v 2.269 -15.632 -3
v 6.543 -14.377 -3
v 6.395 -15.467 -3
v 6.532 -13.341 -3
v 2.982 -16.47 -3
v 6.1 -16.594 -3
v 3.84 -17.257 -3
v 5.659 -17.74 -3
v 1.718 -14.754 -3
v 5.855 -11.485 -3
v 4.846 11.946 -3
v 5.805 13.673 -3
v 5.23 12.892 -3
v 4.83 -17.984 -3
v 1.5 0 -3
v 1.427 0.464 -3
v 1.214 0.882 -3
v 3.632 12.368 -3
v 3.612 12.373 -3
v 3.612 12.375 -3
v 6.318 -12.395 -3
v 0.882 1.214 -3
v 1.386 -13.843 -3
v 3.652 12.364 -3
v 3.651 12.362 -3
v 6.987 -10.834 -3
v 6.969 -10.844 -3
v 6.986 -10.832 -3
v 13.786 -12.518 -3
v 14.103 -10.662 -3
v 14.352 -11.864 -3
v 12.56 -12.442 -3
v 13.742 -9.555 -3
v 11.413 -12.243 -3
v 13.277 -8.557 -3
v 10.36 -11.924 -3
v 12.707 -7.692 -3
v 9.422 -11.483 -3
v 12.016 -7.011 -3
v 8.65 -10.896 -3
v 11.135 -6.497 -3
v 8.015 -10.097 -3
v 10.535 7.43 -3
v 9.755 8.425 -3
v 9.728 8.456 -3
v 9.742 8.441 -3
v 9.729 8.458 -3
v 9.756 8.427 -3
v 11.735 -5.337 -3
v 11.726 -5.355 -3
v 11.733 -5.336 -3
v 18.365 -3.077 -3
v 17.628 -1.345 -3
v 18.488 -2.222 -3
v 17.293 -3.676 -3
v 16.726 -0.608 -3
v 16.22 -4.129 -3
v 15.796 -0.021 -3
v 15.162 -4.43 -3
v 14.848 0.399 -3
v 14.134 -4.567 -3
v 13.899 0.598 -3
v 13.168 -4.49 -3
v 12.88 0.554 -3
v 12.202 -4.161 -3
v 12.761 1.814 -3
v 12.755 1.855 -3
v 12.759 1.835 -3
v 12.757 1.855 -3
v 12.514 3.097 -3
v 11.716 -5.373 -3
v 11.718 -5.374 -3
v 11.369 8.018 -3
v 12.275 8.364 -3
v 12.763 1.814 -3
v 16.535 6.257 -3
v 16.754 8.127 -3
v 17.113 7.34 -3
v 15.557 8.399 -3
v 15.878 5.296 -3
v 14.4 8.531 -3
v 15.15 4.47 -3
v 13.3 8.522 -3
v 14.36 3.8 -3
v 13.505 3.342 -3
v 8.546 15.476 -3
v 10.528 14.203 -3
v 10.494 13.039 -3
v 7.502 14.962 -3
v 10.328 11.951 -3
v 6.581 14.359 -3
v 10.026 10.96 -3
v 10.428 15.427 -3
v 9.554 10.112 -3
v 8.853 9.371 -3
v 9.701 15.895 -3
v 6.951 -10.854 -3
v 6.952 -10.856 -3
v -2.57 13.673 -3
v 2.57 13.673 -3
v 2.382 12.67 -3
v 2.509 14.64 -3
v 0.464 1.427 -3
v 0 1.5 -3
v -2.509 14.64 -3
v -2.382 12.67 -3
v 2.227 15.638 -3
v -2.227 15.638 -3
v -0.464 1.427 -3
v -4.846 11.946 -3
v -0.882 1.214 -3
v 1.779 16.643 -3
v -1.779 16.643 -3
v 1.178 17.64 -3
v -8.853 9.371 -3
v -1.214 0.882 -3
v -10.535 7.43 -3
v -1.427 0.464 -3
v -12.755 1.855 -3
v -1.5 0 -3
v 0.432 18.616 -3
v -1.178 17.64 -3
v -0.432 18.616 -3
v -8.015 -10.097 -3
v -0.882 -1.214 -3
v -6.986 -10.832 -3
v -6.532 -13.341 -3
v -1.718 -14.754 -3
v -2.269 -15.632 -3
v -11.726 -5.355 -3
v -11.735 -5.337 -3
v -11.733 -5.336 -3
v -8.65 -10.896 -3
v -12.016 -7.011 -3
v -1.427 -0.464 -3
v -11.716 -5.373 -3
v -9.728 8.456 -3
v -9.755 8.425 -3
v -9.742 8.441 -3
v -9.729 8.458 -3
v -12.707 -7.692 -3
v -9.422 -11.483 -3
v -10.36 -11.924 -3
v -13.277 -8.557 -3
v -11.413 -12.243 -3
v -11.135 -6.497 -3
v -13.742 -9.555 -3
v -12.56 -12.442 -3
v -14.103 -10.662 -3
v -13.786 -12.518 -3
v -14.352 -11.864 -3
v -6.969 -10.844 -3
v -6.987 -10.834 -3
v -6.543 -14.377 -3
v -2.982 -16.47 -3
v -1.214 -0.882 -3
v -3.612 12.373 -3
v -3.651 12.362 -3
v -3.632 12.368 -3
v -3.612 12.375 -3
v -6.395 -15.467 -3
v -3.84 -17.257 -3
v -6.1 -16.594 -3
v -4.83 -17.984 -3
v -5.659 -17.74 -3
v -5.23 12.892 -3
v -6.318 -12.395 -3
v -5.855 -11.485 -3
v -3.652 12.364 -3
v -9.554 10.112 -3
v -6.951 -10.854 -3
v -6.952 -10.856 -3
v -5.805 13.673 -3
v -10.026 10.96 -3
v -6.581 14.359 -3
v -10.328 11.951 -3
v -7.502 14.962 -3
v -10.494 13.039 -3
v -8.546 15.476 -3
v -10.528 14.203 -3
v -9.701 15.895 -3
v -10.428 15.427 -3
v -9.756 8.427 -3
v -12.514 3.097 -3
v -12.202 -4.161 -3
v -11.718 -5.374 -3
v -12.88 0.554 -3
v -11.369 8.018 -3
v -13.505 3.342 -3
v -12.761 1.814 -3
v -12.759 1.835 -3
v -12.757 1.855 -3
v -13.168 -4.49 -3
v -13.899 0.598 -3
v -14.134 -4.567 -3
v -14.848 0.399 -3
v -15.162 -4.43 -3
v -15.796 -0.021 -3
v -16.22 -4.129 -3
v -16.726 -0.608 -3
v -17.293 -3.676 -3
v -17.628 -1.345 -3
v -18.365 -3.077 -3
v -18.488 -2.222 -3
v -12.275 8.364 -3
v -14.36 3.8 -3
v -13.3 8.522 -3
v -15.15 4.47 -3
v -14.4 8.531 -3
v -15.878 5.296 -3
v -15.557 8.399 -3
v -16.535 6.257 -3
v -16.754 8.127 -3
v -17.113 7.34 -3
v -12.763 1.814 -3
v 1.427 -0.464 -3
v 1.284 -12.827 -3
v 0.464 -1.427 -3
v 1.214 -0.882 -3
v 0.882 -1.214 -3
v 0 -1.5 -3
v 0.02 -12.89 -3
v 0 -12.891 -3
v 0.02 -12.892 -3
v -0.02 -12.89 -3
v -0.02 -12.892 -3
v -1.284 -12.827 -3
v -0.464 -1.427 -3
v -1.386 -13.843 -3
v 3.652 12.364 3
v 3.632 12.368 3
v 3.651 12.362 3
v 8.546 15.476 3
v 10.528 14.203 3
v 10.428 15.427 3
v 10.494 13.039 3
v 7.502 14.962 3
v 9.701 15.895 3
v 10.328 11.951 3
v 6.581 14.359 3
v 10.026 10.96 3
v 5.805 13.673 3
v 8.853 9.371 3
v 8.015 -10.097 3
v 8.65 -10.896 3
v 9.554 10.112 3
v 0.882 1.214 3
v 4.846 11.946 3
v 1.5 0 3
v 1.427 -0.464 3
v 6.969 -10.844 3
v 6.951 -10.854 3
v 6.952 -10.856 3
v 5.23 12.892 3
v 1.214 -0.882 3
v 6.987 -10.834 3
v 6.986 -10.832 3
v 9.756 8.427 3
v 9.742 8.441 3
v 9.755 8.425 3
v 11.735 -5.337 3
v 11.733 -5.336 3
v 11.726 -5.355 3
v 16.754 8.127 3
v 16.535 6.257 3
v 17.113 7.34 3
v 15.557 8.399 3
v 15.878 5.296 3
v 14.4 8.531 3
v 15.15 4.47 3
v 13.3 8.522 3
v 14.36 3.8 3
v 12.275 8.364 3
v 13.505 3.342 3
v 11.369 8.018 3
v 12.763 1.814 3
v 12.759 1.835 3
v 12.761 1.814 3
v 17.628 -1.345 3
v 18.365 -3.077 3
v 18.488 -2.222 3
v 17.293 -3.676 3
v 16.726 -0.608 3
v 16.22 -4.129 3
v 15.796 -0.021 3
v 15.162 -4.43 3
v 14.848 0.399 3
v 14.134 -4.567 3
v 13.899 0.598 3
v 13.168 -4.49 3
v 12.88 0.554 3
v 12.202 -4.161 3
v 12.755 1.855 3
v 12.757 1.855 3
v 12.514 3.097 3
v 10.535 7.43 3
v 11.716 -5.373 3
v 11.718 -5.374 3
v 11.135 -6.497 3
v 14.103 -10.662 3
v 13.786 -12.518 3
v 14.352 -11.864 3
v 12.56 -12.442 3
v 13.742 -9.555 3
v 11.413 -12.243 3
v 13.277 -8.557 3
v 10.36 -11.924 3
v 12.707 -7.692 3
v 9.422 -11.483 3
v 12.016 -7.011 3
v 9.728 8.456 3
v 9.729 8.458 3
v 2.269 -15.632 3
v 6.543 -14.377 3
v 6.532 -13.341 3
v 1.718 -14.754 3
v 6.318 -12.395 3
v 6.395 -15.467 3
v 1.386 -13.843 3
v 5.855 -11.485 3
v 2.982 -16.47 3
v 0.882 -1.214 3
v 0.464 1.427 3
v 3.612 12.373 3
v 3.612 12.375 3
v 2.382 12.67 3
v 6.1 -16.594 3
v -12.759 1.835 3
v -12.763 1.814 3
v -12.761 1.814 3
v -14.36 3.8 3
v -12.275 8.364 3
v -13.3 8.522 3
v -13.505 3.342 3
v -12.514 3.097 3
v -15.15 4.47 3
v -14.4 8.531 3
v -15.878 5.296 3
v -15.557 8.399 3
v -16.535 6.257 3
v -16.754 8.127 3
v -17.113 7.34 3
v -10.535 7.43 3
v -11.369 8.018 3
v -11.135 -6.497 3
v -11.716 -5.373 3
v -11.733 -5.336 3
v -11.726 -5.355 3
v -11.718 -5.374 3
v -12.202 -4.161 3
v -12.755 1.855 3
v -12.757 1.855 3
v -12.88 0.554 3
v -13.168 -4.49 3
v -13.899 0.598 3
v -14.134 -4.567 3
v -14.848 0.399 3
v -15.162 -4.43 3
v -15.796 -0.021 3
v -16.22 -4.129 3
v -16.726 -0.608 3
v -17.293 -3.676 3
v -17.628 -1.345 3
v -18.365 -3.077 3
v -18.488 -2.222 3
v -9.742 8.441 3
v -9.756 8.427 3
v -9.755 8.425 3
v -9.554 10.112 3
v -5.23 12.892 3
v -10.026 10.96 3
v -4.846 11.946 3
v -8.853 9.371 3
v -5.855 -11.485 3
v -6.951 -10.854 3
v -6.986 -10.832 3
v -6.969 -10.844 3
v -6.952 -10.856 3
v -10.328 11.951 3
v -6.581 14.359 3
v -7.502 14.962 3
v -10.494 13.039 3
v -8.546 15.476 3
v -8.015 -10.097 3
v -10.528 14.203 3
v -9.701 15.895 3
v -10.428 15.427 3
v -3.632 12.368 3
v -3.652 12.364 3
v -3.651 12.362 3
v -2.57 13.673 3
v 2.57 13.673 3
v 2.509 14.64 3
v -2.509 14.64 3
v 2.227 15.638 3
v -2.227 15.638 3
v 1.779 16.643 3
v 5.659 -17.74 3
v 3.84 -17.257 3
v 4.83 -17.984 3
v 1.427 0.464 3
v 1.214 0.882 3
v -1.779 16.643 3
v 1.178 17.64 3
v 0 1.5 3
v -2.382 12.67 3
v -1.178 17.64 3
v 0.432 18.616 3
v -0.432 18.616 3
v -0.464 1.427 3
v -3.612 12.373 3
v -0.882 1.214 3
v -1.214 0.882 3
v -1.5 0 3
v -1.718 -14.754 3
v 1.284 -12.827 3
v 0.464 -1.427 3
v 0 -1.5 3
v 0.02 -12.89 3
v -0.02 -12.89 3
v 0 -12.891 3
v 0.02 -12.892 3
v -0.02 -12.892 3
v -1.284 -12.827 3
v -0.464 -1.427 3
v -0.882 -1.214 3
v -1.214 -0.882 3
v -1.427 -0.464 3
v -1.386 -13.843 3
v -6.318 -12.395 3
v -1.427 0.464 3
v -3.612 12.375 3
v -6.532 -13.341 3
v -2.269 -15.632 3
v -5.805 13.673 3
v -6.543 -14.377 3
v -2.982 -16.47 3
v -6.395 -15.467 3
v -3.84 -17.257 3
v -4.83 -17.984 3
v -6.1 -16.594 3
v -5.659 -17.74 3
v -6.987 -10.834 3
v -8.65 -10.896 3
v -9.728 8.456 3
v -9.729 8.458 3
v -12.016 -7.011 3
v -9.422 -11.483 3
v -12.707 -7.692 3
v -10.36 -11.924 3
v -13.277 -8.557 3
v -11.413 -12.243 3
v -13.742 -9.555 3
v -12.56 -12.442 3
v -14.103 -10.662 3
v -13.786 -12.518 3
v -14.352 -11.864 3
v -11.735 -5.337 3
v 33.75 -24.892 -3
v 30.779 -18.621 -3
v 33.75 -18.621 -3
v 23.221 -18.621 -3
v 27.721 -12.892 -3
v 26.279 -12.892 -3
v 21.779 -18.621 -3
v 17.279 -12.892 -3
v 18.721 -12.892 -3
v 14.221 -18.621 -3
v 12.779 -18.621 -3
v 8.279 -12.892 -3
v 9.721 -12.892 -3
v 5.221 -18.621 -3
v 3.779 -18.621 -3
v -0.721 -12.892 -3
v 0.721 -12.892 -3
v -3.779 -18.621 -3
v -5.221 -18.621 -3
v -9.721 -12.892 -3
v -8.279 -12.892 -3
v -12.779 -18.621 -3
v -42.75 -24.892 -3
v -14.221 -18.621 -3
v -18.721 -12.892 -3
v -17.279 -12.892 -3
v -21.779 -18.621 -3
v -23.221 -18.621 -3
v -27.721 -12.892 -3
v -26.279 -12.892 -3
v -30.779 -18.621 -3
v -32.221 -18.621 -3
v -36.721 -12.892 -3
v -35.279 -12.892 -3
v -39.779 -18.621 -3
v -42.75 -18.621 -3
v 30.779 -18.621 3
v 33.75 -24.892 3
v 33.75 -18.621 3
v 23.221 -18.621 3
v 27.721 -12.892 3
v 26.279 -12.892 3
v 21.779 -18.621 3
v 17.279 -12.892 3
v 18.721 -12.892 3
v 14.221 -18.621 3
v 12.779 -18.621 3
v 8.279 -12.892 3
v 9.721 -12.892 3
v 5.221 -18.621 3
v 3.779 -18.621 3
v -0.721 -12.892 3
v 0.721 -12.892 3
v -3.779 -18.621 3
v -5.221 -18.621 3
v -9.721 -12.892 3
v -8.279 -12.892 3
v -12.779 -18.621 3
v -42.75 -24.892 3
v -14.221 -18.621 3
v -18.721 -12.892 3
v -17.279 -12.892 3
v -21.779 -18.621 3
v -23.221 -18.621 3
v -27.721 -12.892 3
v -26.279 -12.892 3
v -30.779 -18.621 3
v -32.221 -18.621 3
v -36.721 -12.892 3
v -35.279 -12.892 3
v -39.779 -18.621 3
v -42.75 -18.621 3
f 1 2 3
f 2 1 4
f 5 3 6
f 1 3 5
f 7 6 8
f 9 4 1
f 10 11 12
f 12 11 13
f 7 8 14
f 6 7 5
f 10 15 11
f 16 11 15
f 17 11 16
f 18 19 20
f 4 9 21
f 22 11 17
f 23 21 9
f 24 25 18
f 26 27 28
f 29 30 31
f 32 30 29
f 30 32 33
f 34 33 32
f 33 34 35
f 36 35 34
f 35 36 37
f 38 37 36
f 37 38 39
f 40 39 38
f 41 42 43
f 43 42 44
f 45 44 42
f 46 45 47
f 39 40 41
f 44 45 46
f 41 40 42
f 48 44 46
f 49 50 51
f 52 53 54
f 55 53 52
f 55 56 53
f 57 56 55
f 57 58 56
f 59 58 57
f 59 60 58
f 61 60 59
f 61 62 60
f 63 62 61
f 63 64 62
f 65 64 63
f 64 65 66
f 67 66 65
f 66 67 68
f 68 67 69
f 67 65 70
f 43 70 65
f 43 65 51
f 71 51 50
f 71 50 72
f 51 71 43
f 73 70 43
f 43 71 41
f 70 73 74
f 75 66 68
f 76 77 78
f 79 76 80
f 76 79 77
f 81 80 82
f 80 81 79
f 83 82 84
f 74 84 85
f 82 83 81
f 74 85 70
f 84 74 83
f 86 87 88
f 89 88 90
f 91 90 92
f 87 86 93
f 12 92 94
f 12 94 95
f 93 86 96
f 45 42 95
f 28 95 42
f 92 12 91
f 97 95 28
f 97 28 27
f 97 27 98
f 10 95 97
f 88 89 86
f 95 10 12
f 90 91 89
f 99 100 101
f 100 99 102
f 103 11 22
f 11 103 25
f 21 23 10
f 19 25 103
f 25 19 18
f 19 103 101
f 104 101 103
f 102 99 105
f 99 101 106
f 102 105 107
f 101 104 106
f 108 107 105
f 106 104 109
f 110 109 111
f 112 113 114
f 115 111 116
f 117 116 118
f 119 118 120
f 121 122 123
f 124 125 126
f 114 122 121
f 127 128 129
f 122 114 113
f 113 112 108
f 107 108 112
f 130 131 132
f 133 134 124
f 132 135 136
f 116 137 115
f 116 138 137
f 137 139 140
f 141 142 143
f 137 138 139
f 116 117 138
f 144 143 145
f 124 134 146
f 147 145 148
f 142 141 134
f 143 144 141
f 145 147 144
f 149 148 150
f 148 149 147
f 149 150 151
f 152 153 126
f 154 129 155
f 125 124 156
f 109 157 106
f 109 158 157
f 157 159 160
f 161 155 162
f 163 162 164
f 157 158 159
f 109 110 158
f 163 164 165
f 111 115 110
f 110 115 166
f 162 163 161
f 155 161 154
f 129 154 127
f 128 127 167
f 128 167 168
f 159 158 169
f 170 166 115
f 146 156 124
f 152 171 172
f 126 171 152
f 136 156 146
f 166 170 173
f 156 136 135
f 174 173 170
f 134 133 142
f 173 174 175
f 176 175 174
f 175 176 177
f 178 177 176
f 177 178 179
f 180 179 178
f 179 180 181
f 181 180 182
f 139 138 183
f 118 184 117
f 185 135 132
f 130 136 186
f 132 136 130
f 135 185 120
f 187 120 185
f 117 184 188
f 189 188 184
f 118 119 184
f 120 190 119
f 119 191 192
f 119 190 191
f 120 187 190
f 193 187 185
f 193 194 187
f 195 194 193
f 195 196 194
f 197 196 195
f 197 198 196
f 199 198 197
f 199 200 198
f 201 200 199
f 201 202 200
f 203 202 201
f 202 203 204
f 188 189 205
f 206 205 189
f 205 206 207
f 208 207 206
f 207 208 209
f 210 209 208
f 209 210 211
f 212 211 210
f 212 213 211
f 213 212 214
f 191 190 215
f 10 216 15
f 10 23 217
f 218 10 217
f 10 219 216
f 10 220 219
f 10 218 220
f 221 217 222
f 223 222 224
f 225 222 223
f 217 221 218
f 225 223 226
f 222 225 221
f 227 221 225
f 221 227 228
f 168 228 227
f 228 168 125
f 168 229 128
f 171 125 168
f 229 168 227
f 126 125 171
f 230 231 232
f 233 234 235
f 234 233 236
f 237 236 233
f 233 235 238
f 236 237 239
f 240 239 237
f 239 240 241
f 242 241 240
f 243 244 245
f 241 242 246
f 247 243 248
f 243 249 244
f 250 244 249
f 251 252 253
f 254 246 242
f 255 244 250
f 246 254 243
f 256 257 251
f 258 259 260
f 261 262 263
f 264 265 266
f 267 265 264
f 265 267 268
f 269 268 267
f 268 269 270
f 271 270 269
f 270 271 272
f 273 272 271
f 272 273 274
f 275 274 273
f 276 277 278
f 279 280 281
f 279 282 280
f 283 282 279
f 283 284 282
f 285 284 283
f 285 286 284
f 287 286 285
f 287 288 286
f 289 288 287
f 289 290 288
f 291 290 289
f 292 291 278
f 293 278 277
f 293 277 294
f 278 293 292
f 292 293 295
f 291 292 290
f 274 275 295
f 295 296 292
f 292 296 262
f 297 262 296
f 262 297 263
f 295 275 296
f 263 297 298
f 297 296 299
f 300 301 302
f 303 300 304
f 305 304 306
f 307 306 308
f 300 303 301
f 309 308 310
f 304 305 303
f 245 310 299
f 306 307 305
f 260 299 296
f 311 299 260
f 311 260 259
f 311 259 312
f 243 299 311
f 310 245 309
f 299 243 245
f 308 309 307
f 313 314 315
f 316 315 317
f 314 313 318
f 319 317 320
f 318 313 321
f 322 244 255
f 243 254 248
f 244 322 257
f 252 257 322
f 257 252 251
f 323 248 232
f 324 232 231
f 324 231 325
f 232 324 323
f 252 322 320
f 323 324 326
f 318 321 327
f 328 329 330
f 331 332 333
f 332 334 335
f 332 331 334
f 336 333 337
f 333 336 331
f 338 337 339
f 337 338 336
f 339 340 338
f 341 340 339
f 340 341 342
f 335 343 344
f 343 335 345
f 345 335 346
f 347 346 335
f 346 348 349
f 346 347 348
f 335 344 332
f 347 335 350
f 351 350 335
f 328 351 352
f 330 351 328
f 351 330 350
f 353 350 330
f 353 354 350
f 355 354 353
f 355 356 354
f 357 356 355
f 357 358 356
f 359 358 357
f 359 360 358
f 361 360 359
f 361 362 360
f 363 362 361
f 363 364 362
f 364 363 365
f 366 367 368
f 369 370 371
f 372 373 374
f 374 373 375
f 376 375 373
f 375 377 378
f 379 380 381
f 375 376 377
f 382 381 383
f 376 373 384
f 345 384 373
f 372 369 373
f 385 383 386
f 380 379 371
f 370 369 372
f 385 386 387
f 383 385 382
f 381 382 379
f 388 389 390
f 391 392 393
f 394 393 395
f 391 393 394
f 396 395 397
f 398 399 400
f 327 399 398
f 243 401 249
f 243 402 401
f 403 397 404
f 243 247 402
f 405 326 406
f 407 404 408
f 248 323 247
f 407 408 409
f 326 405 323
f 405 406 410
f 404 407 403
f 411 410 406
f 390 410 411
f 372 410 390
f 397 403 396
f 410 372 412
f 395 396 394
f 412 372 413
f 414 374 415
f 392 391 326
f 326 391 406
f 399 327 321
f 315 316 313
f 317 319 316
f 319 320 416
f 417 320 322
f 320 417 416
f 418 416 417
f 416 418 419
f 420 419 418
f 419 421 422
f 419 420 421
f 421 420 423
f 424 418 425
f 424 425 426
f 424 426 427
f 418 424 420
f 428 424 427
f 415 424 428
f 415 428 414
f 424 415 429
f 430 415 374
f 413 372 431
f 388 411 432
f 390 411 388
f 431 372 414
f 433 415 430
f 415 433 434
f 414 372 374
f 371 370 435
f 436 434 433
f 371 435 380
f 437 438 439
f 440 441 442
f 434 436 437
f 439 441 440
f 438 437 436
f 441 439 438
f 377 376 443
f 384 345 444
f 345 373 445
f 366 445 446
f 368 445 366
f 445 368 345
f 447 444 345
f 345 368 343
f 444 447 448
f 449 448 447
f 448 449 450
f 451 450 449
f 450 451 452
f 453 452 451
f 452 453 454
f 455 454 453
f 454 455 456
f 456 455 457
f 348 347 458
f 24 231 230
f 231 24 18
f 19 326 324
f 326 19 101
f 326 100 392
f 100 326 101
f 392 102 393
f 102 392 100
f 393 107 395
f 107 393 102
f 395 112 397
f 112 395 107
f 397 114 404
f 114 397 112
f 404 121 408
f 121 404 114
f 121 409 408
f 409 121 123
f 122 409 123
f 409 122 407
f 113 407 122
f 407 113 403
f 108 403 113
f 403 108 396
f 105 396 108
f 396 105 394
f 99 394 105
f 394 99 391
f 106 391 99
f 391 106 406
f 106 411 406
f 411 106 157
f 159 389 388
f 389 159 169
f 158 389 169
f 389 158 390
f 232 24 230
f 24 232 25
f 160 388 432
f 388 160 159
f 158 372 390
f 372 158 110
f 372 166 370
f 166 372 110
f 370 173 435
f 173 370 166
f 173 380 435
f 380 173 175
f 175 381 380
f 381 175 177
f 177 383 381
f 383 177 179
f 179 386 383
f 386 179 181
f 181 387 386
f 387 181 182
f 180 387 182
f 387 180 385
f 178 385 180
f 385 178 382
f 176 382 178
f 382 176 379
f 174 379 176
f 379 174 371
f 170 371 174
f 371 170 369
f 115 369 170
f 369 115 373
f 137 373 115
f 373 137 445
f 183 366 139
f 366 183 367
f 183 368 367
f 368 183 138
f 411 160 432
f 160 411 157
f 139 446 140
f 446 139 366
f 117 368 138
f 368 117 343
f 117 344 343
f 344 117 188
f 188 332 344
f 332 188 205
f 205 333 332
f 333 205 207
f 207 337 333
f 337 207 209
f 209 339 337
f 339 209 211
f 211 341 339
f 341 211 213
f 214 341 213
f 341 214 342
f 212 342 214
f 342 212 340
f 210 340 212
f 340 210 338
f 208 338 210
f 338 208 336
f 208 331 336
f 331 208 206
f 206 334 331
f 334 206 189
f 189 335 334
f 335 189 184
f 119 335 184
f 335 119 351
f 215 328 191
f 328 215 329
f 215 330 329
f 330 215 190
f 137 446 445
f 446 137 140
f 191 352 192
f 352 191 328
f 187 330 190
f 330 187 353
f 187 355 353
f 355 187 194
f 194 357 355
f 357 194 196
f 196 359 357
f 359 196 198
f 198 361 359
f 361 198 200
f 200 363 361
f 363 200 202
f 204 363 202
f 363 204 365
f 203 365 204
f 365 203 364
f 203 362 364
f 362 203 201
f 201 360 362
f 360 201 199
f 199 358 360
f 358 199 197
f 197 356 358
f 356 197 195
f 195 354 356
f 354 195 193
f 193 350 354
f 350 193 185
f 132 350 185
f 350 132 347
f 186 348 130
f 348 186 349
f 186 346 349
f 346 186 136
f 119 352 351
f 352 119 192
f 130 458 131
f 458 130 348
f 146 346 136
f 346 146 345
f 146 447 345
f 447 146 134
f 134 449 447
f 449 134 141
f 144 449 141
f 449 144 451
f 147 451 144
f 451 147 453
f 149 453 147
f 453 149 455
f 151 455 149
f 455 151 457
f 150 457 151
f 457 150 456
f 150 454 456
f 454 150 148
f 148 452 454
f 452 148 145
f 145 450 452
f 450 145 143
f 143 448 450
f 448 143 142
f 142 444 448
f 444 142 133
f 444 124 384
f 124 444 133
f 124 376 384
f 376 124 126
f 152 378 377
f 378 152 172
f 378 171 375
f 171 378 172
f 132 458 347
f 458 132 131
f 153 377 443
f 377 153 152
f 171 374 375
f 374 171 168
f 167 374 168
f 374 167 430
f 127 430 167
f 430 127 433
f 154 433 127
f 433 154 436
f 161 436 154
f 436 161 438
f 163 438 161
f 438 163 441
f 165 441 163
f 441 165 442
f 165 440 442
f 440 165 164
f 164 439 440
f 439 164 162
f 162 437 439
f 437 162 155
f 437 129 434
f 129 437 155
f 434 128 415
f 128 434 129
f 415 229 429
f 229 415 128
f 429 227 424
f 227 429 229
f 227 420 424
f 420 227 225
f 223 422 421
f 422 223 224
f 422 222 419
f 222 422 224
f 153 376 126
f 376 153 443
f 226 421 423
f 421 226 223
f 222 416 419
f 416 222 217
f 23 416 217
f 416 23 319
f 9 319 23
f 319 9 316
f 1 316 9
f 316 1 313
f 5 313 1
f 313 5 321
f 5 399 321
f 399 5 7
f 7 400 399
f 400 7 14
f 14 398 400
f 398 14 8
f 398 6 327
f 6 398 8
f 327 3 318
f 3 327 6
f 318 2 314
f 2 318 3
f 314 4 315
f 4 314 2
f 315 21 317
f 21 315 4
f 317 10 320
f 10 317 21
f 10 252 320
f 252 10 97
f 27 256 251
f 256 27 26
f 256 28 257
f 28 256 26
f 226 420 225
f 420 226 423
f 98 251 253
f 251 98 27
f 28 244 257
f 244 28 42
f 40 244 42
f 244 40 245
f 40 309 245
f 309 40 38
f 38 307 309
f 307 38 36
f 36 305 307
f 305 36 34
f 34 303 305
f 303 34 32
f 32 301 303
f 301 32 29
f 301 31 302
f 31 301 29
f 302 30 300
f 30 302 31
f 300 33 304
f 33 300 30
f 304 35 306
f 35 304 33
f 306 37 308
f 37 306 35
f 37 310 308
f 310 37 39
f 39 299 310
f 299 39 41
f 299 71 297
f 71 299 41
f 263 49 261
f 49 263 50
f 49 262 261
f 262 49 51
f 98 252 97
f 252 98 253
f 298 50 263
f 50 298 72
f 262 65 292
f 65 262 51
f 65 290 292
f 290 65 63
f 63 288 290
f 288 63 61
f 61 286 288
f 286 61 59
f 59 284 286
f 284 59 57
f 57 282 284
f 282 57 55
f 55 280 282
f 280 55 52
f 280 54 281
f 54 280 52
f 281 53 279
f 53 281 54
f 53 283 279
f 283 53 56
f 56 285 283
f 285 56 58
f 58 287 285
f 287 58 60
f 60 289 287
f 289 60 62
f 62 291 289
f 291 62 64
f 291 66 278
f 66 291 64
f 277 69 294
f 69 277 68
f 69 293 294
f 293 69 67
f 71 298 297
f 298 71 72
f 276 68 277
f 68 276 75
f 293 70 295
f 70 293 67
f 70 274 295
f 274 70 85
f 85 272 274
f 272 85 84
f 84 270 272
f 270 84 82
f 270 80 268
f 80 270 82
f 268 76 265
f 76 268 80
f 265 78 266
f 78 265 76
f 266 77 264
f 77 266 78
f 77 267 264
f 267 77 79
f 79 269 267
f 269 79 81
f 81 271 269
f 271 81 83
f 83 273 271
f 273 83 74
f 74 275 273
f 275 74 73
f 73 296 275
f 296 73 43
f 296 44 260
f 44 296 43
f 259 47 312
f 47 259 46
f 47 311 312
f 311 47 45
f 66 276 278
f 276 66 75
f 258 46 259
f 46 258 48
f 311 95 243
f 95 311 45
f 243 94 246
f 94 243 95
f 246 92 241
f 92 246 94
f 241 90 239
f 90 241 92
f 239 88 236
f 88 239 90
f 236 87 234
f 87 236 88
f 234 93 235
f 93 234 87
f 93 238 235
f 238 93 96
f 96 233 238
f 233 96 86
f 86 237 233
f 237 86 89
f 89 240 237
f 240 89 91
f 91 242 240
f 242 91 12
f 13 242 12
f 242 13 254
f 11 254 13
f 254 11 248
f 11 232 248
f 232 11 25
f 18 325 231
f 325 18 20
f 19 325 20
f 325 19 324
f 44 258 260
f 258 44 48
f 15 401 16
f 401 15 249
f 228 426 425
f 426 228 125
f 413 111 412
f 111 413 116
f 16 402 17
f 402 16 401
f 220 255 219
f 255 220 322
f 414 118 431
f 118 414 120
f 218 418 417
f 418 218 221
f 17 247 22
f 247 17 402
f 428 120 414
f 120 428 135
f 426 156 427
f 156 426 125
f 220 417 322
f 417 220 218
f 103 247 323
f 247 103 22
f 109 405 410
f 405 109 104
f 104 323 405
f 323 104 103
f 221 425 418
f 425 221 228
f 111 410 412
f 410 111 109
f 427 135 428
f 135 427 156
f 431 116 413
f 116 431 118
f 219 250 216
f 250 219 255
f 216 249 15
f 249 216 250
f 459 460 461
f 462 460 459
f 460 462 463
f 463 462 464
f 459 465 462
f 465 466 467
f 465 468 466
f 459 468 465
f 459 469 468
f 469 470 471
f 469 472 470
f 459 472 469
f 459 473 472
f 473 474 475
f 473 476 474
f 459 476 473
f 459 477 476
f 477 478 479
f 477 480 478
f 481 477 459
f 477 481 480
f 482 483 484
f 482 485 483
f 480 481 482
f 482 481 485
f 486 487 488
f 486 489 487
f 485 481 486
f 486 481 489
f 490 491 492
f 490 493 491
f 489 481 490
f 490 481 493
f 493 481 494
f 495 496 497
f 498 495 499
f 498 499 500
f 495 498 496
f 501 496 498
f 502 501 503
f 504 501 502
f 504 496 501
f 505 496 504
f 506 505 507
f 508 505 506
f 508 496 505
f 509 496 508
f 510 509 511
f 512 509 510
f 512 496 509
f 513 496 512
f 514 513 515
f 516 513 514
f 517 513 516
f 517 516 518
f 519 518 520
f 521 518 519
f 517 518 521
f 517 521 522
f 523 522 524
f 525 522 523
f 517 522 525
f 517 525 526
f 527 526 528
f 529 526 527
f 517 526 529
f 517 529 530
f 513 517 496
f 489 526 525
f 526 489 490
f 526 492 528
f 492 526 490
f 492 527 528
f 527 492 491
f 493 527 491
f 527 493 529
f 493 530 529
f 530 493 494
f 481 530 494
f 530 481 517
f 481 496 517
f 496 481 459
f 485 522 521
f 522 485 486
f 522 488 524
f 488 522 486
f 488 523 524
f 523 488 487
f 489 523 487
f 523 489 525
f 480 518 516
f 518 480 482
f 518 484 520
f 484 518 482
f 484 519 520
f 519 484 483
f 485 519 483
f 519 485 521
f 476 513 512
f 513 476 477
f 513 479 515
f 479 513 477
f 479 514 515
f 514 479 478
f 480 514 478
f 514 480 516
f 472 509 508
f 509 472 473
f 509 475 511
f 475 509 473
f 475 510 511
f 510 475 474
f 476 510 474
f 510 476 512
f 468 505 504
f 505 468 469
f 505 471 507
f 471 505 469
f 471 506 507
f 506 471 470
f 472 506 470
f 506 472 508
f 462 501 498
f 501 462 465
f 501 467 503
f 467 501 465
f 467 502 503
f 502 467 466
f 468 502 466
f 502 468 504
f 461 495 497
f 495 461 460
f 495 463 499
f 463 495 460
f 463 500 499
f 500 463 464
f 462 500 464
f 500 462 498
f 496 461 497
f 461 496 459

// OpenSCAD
//////////////////////////////////////////////////////////////////////////////////////////////
// Public Domain Parametric Involute Spur Gear (and involute helical gear and involute rack)
// version 1.1
// by Leemon Baird, 2011, Leemon@Leemon.com
//http://www.thingiverse.com/thing:5505
//
// This file is public domain.  Use it for any purpose, including commercial
// applications.  Attribution would be nice, but is not required.  There is
// no warranty of any kind, including its correctness, usefulness, or safety.
// 
// This is parameterized involute spur (or helical) gear.  It is much simpler and less powerful than
// others on Thingiverse.  But it is public domain.  I implemented it from scratch from the 
// descriptions and equations on Wikipedia and the web, using Mathematica for calculations and testing,
// and I now release it into the public domain.
//
//		http://en.wikipedia.org/wiki/Involute_gear
//		http://en.wikipedia.org/wiki/Gear
//		http://en.wikipedia.org/wiki/List_of_gear_nomenclature
//		http://gtrebaol.free.fr/doc/catia/spur_gear.html
//		http://www.cs.cmu.edu/~rapidproto/mechanisms/chpt7.html
//
// The module gear() gives an involute spur gear, with reasonable defaults for all the parameters.
// Normally, you should just choose the first 4 parameters, and let the rest be default values.
// The module gear() gives a gear in the XY plane, centered on the origin, with one tooth centered on
// the positive Y axis.  The various functions below it take the same parameters, and return various
// measurements for the gear.  The most important is pitch_radius, which tells how far apart to space
// gears that are meshing, and adendum_radius, which gives the size of the region filled by the gear.
// A gear has a "pitch circle", which is an invisible circle that cuts through the middle of each
// tooth (though not the exact center). In order for two gears to mesh, their pitch circles should 
// just touch.  So the distance between their centers should be pitch_radius() for one, plus pitch_radius() 
// for the other, which gives the radii of their pitch circles.
//
// In order for two gears to mesh, they must have the same mm_per_tooth and pressure_angle parameters.  
// mm_per_tooth gives the number of millimeters of arc around the pitch circle covered by one tooth and one
// space between teeth.  The pitch angle controls how flat or bulged the sides of the teeth are.  Common
// values include 14.5 degrees and 20 degrees, and occasionally 25.  Though I've seen 28 recommended for
// plastic gears. Larger numbers bulge out more, giving stronger teeth, so 28 degrees is the default here.
//
// The ratio of number_of_teeth for two meshing gears gives how many times one will make a full 
// revolution when the the other makes one full revolution.  If the two numbers are coprime (i.e. 
// are not both divisible by the same number greater than 1), then every tooth on one gear
// will meet every tooth on the other, for more even wear.  So coprime numbers of teeth are good.
//
// The module rack() gives a rack, which is a bar with teeth.  A rack can mesh with any
// gear that has the same mm_per_tooth and pressure_angle.
//
// Some terminology: 
// The outline of a gear is a smooth circle (the "pitch circle") which has mountains and valleys
// added so it is toothed.  So there is an inner circle (the "root circle") that touches the 
// base of all the teeth, an outer circle that touches the tips of all the teeth,
// and the invisible pitch circle in between them.  There is also a "base circle", which can be smaller than
// all three of the others, which controls the shape of the teeth.  The side of each tooth lies on the path 
// that the end of a string would follow if it were wrapped tightly around the base circle, then slowly unwound.  
// That shape is an "involute", which gives this type of gear its name.
//
//////////////////////////////////////////////////////////////////////////////////////////////

//An involute spur gear, with reasonable defaults for all the parameters.
//Normally, you should just choose the first 4 parameters, and let the rest be default values.
//Meshing gears must match in mm_per_tooth, pressure_angle, and twist,
//and be separated by the sum of their pitch radii, which can be found with pitch_radius().
module gear (
	mm_per_tooth    = 3,    //this is the "circular pitch", the circumference of the pitch circle divided by the number of teeth
	number_of_teeth = 11,   //total number of teeth around the entire perimeter
	thickness       = 6,    //thickness of gear in mm
	hole_diameter   = 3,    //diameter of the hole in the center, in mm
	twist           = 0,    //teeth rotate this many degrees from bottom of gear to top.  360 makes the gear a screw with each thread going around once
	teeth_to_hide   = 0,    //number of teeth to delete to make this only a fraction of a circle
	pressure_angle  = 28,   //Controls how straight or bulged the tooth sides are. In degrees.
	clearance       = 0.0,  //gap between top of a tooth on one gear and bottom of valley on a meshing gear (in millimeters)
	backlash        = 0.0   //gap between two meshing teeth, in the direction along the circumference of the pitch circle
) {
	pi = 3.1415926;
	p  = mm_per_tooth * number_of_teeth / pi / 2;  //radius of pitch circle
	c  = p + mm_per_tooth / pi - clearance;        //radius of outer circle
	b  = p*cos(pressure_angle);                   //radius of base circle
	r  = p-(c-p)-clearance;                        //radius of root circle
	t  = mm_per_tooth/2-backlash/2;                //tooth thickness at pitch circle
	k  = -iang(b, p) - t/2/p/pi*180; //angle to where involute meets base circle on each side of tooth
  {             
		difference() {
			for (i = [0:number_of_teeth-teeth_to_hide-1] )
				rotate([0,0,i*360/number_of_teeth])
					linear_extrude(height = thickness, center = true, convexity = 10, twist = twist)
						polygon(
							points=[
								[0, -hole_diameter/10],
								polar(r, -181/number_of_teeth),
								polar(r, r<b ? k : -180/number_of_teeth),
								q7(0/5,r,b,c,k, 1),q7(1/5,r,b,c,k, 1),q7(2/5,r,b,c,k, 1),q7(3/5,r,b,c,k, 1),q7(4/5,r,b,c,k, 1),q7(5/5,r,b,c,k, 1),
								q7(5/5,r,b,c,k,-1),q7(4/5,r,b,c,k,-1),q7(3/5,r,b,c,k,-1),q7(2/5,r,b,c,k,-1),q7(1/5,r,b,c,k,-1),q7(0/5,r,b,c,k,-1),
								polar(r, r<b ? -k : 180/number_of_teeth),
								polar(r, 181/number_of_teeth)
							],
 							paths=[[0,1,2,3,4,5,6,7,8,9,10,11,12,13,14,15,16]]
						);
			cylinder(h=2*thickness+1, r=hole_diameter/2, center=true, $fn=20);
		}
	}
};	
//these 4 functions are used by gear
function polar(r,theta)   = r*[sin(theta), cos(theta)];                            //convert polar to cartesian coordinates
function iang(r1,r2)      = sqrt((r2/r1)*(r2/r1) - 1)/3.1415926*180 - acos(r1/r2); //unwind a string this many degrees to go from radius r1 to radius r2
function q7(f,r,b,r2,t,s) = q6(b,s,t,(1-f)*max(b,r)+f*r2);                         //radius a fraction f up the curved side of the tooth 
function q6(b,s,t,d)      = polar(d,s*(iang(b,d)+t));                              //point at radius d on the involute curve

//a rack, which is a straight line with teeth (the same as a segment from a giant gear with a huge number of teeth).
//The "pitch circle" is a line along the X axis.
module rack (
	mm_per_tooth    = 3,    //this is the "circular pitch", the circumference of the pitch circle divided by the number of teeth
	number_of_teeth = 11,   //total number of teeth along the rack
	thickness       = 6,    //thickness of rack in mm (affects each tooth)
	height          = 120,   //height of rack in mm, from tooth top to far side of rack.
	pressure_angle  = 28,   //Controls how straight or bulged the tooth sides are. In degrees.
	backlash        = 0.0   //gap between two meshing teeth, in the direction along the circumference of the pitch circle
) {
	pi = 3.1415926;
	a = mm_per_tooth / pi; //addendum
	t = a*cos(pressure_angle)-1;         //tooth side is tilted so top/bottom corners move this amount
		for (i = [0:number_of_teeth-1] )
			translate([i*mm_per_tooth,0,0])
				linear_extrude(height = thickness, center = true, convexity = 10)
					polygon(
						points=[
							[-mm_per_tooth * 3/4,                 a-height],
							[-mm_per_tooth * 3/4 - backlash,     -a],
							[-mm_per_tooth * 1/4 + backlash - t, -a],
							[-mm_per_tooth * 1/4 + backlash + t,  a],
							[ mm_per_tooth * 1/4 - backlash - t,  a],
							[ mm_per_tooth * 1/4 - backlash + t, -a],
							[ mm_per_tooth * 3/4 + backlash,     -a],
							[ mm_per_tooth * 3/4,                 a-height],
						],
						paths=[[0,1,2,3,4,5,6,7]]
					);
};	

//These 5 functions let the user find the derived dimensions of the gear.
//A gear fits within a circle of radius outer_radius, and two gears should have
//their centers separated by the sum of their pictch_radius.
function circular_pitch  (mm_per_tooth=3) = mm_per_tooth;                     //tooth density expressed as "circular pitch" in millimeters
function diametral_pitch (mm_per_tooth=3) = 3.1415926 / mm_per_tooth;         //tooth density expressed as "diametral pitch" in teeth per millimeter
function module_value    (mm_per_tooth=3) = mm_per_tooth / pi;                //tooth density expressed as "module" or "modulus" in millimeters
function pitch_radius    (mm_per_tooth=3,number_of_teeth=11) = mm_per_tooth * number_of_teeth / 3.1415926 / 2;
function outer_radius    (mm_per_tooth=3,number_of_teeth=11,clearance=0.1)    //The gear fits entirely within a cylinder of this radius.
	= mm_per_tooth*(1+number_of_teeth/2)/3.1415926  - clearance;              

//////////////////////////////////////////////////////////////////////////////////////////////
//example gear train.  
//Try it with OpenSCAD View/Animate command with 20 steps and 24 FPS.
//The gears will continue to be rotated to mesh correctly if you change the number of teeth.

n1 = 11; //red gear number of teeth
n2 = 20; //green gear
n3 = 5;  //blue gear
n4 = 20; //orange gear
n5 = 8;  //gray rack
mm_per_tooth = 9; //all meshing gears need the same mm_per_tooth (and the same pressure_angle)
thickness    = 6;
hole         = 3;
height       = 12;

d1 =pitch_radius(mm_per_tooth,n1);
d12=pitch_radius(mm_per_tooth,n1) + pitch_radius(mm_per_tooth,n2);
d13=pitch_radius(mm_per_tooth,n1) + pitch_radius(mm_per_tooth,n3);
d14=pitch_radius(mm_per_tooth,n1) + pitch_radius(mm_per_tooth,n4);

translate([ 0,    0, 0]) rotate([0,0, $t*360/n1])                 color([1.00,0.75,0.75]) gear(mm_per_tooth,n1,thickness,hole);
//translate([ 0,  d12, 0]) rotate([0,0,-($t+n2/2-0*n1+1/2)*360/n2]) color([0.75,1.00,0.75]) gear(mm_per_tooth,n2,thickness,hole,0,108);
//translate([ d13,  0, 0]) rotate([0,0,-($t-n3/4+n1/4+1/2)*360/n3]) color([0.75,0.75,1.00]) gear(mm_per_tooth,n3,thickness,hole);
//translate([ d13,  0, 0]) rotate([0,0,-($t-n3/4+n1/4+1/2)*360/n3]) color([0.75,0.75,1.00]) gear(mm_per_tooth,n3,thickness,hole);
//translate([-d14,  0, 0]) rotate([0,0,-($t-n4/4-n1/4+1/2-floor(n4/4)-3)*360/n4]) color([1.00,0.75,0.50]) gear(mm_per_tooth,n4,thickness,hole,0,n4-3);
translate([(-floor(n5/2)-floor(n1/2)+$t+n1/2-1/2)*9, -d1+0.0, 0]) rotate([0,0,0]) color([0.75,0.75,0.75]) rack(mm_per_tooth,n5,thickness,height);
